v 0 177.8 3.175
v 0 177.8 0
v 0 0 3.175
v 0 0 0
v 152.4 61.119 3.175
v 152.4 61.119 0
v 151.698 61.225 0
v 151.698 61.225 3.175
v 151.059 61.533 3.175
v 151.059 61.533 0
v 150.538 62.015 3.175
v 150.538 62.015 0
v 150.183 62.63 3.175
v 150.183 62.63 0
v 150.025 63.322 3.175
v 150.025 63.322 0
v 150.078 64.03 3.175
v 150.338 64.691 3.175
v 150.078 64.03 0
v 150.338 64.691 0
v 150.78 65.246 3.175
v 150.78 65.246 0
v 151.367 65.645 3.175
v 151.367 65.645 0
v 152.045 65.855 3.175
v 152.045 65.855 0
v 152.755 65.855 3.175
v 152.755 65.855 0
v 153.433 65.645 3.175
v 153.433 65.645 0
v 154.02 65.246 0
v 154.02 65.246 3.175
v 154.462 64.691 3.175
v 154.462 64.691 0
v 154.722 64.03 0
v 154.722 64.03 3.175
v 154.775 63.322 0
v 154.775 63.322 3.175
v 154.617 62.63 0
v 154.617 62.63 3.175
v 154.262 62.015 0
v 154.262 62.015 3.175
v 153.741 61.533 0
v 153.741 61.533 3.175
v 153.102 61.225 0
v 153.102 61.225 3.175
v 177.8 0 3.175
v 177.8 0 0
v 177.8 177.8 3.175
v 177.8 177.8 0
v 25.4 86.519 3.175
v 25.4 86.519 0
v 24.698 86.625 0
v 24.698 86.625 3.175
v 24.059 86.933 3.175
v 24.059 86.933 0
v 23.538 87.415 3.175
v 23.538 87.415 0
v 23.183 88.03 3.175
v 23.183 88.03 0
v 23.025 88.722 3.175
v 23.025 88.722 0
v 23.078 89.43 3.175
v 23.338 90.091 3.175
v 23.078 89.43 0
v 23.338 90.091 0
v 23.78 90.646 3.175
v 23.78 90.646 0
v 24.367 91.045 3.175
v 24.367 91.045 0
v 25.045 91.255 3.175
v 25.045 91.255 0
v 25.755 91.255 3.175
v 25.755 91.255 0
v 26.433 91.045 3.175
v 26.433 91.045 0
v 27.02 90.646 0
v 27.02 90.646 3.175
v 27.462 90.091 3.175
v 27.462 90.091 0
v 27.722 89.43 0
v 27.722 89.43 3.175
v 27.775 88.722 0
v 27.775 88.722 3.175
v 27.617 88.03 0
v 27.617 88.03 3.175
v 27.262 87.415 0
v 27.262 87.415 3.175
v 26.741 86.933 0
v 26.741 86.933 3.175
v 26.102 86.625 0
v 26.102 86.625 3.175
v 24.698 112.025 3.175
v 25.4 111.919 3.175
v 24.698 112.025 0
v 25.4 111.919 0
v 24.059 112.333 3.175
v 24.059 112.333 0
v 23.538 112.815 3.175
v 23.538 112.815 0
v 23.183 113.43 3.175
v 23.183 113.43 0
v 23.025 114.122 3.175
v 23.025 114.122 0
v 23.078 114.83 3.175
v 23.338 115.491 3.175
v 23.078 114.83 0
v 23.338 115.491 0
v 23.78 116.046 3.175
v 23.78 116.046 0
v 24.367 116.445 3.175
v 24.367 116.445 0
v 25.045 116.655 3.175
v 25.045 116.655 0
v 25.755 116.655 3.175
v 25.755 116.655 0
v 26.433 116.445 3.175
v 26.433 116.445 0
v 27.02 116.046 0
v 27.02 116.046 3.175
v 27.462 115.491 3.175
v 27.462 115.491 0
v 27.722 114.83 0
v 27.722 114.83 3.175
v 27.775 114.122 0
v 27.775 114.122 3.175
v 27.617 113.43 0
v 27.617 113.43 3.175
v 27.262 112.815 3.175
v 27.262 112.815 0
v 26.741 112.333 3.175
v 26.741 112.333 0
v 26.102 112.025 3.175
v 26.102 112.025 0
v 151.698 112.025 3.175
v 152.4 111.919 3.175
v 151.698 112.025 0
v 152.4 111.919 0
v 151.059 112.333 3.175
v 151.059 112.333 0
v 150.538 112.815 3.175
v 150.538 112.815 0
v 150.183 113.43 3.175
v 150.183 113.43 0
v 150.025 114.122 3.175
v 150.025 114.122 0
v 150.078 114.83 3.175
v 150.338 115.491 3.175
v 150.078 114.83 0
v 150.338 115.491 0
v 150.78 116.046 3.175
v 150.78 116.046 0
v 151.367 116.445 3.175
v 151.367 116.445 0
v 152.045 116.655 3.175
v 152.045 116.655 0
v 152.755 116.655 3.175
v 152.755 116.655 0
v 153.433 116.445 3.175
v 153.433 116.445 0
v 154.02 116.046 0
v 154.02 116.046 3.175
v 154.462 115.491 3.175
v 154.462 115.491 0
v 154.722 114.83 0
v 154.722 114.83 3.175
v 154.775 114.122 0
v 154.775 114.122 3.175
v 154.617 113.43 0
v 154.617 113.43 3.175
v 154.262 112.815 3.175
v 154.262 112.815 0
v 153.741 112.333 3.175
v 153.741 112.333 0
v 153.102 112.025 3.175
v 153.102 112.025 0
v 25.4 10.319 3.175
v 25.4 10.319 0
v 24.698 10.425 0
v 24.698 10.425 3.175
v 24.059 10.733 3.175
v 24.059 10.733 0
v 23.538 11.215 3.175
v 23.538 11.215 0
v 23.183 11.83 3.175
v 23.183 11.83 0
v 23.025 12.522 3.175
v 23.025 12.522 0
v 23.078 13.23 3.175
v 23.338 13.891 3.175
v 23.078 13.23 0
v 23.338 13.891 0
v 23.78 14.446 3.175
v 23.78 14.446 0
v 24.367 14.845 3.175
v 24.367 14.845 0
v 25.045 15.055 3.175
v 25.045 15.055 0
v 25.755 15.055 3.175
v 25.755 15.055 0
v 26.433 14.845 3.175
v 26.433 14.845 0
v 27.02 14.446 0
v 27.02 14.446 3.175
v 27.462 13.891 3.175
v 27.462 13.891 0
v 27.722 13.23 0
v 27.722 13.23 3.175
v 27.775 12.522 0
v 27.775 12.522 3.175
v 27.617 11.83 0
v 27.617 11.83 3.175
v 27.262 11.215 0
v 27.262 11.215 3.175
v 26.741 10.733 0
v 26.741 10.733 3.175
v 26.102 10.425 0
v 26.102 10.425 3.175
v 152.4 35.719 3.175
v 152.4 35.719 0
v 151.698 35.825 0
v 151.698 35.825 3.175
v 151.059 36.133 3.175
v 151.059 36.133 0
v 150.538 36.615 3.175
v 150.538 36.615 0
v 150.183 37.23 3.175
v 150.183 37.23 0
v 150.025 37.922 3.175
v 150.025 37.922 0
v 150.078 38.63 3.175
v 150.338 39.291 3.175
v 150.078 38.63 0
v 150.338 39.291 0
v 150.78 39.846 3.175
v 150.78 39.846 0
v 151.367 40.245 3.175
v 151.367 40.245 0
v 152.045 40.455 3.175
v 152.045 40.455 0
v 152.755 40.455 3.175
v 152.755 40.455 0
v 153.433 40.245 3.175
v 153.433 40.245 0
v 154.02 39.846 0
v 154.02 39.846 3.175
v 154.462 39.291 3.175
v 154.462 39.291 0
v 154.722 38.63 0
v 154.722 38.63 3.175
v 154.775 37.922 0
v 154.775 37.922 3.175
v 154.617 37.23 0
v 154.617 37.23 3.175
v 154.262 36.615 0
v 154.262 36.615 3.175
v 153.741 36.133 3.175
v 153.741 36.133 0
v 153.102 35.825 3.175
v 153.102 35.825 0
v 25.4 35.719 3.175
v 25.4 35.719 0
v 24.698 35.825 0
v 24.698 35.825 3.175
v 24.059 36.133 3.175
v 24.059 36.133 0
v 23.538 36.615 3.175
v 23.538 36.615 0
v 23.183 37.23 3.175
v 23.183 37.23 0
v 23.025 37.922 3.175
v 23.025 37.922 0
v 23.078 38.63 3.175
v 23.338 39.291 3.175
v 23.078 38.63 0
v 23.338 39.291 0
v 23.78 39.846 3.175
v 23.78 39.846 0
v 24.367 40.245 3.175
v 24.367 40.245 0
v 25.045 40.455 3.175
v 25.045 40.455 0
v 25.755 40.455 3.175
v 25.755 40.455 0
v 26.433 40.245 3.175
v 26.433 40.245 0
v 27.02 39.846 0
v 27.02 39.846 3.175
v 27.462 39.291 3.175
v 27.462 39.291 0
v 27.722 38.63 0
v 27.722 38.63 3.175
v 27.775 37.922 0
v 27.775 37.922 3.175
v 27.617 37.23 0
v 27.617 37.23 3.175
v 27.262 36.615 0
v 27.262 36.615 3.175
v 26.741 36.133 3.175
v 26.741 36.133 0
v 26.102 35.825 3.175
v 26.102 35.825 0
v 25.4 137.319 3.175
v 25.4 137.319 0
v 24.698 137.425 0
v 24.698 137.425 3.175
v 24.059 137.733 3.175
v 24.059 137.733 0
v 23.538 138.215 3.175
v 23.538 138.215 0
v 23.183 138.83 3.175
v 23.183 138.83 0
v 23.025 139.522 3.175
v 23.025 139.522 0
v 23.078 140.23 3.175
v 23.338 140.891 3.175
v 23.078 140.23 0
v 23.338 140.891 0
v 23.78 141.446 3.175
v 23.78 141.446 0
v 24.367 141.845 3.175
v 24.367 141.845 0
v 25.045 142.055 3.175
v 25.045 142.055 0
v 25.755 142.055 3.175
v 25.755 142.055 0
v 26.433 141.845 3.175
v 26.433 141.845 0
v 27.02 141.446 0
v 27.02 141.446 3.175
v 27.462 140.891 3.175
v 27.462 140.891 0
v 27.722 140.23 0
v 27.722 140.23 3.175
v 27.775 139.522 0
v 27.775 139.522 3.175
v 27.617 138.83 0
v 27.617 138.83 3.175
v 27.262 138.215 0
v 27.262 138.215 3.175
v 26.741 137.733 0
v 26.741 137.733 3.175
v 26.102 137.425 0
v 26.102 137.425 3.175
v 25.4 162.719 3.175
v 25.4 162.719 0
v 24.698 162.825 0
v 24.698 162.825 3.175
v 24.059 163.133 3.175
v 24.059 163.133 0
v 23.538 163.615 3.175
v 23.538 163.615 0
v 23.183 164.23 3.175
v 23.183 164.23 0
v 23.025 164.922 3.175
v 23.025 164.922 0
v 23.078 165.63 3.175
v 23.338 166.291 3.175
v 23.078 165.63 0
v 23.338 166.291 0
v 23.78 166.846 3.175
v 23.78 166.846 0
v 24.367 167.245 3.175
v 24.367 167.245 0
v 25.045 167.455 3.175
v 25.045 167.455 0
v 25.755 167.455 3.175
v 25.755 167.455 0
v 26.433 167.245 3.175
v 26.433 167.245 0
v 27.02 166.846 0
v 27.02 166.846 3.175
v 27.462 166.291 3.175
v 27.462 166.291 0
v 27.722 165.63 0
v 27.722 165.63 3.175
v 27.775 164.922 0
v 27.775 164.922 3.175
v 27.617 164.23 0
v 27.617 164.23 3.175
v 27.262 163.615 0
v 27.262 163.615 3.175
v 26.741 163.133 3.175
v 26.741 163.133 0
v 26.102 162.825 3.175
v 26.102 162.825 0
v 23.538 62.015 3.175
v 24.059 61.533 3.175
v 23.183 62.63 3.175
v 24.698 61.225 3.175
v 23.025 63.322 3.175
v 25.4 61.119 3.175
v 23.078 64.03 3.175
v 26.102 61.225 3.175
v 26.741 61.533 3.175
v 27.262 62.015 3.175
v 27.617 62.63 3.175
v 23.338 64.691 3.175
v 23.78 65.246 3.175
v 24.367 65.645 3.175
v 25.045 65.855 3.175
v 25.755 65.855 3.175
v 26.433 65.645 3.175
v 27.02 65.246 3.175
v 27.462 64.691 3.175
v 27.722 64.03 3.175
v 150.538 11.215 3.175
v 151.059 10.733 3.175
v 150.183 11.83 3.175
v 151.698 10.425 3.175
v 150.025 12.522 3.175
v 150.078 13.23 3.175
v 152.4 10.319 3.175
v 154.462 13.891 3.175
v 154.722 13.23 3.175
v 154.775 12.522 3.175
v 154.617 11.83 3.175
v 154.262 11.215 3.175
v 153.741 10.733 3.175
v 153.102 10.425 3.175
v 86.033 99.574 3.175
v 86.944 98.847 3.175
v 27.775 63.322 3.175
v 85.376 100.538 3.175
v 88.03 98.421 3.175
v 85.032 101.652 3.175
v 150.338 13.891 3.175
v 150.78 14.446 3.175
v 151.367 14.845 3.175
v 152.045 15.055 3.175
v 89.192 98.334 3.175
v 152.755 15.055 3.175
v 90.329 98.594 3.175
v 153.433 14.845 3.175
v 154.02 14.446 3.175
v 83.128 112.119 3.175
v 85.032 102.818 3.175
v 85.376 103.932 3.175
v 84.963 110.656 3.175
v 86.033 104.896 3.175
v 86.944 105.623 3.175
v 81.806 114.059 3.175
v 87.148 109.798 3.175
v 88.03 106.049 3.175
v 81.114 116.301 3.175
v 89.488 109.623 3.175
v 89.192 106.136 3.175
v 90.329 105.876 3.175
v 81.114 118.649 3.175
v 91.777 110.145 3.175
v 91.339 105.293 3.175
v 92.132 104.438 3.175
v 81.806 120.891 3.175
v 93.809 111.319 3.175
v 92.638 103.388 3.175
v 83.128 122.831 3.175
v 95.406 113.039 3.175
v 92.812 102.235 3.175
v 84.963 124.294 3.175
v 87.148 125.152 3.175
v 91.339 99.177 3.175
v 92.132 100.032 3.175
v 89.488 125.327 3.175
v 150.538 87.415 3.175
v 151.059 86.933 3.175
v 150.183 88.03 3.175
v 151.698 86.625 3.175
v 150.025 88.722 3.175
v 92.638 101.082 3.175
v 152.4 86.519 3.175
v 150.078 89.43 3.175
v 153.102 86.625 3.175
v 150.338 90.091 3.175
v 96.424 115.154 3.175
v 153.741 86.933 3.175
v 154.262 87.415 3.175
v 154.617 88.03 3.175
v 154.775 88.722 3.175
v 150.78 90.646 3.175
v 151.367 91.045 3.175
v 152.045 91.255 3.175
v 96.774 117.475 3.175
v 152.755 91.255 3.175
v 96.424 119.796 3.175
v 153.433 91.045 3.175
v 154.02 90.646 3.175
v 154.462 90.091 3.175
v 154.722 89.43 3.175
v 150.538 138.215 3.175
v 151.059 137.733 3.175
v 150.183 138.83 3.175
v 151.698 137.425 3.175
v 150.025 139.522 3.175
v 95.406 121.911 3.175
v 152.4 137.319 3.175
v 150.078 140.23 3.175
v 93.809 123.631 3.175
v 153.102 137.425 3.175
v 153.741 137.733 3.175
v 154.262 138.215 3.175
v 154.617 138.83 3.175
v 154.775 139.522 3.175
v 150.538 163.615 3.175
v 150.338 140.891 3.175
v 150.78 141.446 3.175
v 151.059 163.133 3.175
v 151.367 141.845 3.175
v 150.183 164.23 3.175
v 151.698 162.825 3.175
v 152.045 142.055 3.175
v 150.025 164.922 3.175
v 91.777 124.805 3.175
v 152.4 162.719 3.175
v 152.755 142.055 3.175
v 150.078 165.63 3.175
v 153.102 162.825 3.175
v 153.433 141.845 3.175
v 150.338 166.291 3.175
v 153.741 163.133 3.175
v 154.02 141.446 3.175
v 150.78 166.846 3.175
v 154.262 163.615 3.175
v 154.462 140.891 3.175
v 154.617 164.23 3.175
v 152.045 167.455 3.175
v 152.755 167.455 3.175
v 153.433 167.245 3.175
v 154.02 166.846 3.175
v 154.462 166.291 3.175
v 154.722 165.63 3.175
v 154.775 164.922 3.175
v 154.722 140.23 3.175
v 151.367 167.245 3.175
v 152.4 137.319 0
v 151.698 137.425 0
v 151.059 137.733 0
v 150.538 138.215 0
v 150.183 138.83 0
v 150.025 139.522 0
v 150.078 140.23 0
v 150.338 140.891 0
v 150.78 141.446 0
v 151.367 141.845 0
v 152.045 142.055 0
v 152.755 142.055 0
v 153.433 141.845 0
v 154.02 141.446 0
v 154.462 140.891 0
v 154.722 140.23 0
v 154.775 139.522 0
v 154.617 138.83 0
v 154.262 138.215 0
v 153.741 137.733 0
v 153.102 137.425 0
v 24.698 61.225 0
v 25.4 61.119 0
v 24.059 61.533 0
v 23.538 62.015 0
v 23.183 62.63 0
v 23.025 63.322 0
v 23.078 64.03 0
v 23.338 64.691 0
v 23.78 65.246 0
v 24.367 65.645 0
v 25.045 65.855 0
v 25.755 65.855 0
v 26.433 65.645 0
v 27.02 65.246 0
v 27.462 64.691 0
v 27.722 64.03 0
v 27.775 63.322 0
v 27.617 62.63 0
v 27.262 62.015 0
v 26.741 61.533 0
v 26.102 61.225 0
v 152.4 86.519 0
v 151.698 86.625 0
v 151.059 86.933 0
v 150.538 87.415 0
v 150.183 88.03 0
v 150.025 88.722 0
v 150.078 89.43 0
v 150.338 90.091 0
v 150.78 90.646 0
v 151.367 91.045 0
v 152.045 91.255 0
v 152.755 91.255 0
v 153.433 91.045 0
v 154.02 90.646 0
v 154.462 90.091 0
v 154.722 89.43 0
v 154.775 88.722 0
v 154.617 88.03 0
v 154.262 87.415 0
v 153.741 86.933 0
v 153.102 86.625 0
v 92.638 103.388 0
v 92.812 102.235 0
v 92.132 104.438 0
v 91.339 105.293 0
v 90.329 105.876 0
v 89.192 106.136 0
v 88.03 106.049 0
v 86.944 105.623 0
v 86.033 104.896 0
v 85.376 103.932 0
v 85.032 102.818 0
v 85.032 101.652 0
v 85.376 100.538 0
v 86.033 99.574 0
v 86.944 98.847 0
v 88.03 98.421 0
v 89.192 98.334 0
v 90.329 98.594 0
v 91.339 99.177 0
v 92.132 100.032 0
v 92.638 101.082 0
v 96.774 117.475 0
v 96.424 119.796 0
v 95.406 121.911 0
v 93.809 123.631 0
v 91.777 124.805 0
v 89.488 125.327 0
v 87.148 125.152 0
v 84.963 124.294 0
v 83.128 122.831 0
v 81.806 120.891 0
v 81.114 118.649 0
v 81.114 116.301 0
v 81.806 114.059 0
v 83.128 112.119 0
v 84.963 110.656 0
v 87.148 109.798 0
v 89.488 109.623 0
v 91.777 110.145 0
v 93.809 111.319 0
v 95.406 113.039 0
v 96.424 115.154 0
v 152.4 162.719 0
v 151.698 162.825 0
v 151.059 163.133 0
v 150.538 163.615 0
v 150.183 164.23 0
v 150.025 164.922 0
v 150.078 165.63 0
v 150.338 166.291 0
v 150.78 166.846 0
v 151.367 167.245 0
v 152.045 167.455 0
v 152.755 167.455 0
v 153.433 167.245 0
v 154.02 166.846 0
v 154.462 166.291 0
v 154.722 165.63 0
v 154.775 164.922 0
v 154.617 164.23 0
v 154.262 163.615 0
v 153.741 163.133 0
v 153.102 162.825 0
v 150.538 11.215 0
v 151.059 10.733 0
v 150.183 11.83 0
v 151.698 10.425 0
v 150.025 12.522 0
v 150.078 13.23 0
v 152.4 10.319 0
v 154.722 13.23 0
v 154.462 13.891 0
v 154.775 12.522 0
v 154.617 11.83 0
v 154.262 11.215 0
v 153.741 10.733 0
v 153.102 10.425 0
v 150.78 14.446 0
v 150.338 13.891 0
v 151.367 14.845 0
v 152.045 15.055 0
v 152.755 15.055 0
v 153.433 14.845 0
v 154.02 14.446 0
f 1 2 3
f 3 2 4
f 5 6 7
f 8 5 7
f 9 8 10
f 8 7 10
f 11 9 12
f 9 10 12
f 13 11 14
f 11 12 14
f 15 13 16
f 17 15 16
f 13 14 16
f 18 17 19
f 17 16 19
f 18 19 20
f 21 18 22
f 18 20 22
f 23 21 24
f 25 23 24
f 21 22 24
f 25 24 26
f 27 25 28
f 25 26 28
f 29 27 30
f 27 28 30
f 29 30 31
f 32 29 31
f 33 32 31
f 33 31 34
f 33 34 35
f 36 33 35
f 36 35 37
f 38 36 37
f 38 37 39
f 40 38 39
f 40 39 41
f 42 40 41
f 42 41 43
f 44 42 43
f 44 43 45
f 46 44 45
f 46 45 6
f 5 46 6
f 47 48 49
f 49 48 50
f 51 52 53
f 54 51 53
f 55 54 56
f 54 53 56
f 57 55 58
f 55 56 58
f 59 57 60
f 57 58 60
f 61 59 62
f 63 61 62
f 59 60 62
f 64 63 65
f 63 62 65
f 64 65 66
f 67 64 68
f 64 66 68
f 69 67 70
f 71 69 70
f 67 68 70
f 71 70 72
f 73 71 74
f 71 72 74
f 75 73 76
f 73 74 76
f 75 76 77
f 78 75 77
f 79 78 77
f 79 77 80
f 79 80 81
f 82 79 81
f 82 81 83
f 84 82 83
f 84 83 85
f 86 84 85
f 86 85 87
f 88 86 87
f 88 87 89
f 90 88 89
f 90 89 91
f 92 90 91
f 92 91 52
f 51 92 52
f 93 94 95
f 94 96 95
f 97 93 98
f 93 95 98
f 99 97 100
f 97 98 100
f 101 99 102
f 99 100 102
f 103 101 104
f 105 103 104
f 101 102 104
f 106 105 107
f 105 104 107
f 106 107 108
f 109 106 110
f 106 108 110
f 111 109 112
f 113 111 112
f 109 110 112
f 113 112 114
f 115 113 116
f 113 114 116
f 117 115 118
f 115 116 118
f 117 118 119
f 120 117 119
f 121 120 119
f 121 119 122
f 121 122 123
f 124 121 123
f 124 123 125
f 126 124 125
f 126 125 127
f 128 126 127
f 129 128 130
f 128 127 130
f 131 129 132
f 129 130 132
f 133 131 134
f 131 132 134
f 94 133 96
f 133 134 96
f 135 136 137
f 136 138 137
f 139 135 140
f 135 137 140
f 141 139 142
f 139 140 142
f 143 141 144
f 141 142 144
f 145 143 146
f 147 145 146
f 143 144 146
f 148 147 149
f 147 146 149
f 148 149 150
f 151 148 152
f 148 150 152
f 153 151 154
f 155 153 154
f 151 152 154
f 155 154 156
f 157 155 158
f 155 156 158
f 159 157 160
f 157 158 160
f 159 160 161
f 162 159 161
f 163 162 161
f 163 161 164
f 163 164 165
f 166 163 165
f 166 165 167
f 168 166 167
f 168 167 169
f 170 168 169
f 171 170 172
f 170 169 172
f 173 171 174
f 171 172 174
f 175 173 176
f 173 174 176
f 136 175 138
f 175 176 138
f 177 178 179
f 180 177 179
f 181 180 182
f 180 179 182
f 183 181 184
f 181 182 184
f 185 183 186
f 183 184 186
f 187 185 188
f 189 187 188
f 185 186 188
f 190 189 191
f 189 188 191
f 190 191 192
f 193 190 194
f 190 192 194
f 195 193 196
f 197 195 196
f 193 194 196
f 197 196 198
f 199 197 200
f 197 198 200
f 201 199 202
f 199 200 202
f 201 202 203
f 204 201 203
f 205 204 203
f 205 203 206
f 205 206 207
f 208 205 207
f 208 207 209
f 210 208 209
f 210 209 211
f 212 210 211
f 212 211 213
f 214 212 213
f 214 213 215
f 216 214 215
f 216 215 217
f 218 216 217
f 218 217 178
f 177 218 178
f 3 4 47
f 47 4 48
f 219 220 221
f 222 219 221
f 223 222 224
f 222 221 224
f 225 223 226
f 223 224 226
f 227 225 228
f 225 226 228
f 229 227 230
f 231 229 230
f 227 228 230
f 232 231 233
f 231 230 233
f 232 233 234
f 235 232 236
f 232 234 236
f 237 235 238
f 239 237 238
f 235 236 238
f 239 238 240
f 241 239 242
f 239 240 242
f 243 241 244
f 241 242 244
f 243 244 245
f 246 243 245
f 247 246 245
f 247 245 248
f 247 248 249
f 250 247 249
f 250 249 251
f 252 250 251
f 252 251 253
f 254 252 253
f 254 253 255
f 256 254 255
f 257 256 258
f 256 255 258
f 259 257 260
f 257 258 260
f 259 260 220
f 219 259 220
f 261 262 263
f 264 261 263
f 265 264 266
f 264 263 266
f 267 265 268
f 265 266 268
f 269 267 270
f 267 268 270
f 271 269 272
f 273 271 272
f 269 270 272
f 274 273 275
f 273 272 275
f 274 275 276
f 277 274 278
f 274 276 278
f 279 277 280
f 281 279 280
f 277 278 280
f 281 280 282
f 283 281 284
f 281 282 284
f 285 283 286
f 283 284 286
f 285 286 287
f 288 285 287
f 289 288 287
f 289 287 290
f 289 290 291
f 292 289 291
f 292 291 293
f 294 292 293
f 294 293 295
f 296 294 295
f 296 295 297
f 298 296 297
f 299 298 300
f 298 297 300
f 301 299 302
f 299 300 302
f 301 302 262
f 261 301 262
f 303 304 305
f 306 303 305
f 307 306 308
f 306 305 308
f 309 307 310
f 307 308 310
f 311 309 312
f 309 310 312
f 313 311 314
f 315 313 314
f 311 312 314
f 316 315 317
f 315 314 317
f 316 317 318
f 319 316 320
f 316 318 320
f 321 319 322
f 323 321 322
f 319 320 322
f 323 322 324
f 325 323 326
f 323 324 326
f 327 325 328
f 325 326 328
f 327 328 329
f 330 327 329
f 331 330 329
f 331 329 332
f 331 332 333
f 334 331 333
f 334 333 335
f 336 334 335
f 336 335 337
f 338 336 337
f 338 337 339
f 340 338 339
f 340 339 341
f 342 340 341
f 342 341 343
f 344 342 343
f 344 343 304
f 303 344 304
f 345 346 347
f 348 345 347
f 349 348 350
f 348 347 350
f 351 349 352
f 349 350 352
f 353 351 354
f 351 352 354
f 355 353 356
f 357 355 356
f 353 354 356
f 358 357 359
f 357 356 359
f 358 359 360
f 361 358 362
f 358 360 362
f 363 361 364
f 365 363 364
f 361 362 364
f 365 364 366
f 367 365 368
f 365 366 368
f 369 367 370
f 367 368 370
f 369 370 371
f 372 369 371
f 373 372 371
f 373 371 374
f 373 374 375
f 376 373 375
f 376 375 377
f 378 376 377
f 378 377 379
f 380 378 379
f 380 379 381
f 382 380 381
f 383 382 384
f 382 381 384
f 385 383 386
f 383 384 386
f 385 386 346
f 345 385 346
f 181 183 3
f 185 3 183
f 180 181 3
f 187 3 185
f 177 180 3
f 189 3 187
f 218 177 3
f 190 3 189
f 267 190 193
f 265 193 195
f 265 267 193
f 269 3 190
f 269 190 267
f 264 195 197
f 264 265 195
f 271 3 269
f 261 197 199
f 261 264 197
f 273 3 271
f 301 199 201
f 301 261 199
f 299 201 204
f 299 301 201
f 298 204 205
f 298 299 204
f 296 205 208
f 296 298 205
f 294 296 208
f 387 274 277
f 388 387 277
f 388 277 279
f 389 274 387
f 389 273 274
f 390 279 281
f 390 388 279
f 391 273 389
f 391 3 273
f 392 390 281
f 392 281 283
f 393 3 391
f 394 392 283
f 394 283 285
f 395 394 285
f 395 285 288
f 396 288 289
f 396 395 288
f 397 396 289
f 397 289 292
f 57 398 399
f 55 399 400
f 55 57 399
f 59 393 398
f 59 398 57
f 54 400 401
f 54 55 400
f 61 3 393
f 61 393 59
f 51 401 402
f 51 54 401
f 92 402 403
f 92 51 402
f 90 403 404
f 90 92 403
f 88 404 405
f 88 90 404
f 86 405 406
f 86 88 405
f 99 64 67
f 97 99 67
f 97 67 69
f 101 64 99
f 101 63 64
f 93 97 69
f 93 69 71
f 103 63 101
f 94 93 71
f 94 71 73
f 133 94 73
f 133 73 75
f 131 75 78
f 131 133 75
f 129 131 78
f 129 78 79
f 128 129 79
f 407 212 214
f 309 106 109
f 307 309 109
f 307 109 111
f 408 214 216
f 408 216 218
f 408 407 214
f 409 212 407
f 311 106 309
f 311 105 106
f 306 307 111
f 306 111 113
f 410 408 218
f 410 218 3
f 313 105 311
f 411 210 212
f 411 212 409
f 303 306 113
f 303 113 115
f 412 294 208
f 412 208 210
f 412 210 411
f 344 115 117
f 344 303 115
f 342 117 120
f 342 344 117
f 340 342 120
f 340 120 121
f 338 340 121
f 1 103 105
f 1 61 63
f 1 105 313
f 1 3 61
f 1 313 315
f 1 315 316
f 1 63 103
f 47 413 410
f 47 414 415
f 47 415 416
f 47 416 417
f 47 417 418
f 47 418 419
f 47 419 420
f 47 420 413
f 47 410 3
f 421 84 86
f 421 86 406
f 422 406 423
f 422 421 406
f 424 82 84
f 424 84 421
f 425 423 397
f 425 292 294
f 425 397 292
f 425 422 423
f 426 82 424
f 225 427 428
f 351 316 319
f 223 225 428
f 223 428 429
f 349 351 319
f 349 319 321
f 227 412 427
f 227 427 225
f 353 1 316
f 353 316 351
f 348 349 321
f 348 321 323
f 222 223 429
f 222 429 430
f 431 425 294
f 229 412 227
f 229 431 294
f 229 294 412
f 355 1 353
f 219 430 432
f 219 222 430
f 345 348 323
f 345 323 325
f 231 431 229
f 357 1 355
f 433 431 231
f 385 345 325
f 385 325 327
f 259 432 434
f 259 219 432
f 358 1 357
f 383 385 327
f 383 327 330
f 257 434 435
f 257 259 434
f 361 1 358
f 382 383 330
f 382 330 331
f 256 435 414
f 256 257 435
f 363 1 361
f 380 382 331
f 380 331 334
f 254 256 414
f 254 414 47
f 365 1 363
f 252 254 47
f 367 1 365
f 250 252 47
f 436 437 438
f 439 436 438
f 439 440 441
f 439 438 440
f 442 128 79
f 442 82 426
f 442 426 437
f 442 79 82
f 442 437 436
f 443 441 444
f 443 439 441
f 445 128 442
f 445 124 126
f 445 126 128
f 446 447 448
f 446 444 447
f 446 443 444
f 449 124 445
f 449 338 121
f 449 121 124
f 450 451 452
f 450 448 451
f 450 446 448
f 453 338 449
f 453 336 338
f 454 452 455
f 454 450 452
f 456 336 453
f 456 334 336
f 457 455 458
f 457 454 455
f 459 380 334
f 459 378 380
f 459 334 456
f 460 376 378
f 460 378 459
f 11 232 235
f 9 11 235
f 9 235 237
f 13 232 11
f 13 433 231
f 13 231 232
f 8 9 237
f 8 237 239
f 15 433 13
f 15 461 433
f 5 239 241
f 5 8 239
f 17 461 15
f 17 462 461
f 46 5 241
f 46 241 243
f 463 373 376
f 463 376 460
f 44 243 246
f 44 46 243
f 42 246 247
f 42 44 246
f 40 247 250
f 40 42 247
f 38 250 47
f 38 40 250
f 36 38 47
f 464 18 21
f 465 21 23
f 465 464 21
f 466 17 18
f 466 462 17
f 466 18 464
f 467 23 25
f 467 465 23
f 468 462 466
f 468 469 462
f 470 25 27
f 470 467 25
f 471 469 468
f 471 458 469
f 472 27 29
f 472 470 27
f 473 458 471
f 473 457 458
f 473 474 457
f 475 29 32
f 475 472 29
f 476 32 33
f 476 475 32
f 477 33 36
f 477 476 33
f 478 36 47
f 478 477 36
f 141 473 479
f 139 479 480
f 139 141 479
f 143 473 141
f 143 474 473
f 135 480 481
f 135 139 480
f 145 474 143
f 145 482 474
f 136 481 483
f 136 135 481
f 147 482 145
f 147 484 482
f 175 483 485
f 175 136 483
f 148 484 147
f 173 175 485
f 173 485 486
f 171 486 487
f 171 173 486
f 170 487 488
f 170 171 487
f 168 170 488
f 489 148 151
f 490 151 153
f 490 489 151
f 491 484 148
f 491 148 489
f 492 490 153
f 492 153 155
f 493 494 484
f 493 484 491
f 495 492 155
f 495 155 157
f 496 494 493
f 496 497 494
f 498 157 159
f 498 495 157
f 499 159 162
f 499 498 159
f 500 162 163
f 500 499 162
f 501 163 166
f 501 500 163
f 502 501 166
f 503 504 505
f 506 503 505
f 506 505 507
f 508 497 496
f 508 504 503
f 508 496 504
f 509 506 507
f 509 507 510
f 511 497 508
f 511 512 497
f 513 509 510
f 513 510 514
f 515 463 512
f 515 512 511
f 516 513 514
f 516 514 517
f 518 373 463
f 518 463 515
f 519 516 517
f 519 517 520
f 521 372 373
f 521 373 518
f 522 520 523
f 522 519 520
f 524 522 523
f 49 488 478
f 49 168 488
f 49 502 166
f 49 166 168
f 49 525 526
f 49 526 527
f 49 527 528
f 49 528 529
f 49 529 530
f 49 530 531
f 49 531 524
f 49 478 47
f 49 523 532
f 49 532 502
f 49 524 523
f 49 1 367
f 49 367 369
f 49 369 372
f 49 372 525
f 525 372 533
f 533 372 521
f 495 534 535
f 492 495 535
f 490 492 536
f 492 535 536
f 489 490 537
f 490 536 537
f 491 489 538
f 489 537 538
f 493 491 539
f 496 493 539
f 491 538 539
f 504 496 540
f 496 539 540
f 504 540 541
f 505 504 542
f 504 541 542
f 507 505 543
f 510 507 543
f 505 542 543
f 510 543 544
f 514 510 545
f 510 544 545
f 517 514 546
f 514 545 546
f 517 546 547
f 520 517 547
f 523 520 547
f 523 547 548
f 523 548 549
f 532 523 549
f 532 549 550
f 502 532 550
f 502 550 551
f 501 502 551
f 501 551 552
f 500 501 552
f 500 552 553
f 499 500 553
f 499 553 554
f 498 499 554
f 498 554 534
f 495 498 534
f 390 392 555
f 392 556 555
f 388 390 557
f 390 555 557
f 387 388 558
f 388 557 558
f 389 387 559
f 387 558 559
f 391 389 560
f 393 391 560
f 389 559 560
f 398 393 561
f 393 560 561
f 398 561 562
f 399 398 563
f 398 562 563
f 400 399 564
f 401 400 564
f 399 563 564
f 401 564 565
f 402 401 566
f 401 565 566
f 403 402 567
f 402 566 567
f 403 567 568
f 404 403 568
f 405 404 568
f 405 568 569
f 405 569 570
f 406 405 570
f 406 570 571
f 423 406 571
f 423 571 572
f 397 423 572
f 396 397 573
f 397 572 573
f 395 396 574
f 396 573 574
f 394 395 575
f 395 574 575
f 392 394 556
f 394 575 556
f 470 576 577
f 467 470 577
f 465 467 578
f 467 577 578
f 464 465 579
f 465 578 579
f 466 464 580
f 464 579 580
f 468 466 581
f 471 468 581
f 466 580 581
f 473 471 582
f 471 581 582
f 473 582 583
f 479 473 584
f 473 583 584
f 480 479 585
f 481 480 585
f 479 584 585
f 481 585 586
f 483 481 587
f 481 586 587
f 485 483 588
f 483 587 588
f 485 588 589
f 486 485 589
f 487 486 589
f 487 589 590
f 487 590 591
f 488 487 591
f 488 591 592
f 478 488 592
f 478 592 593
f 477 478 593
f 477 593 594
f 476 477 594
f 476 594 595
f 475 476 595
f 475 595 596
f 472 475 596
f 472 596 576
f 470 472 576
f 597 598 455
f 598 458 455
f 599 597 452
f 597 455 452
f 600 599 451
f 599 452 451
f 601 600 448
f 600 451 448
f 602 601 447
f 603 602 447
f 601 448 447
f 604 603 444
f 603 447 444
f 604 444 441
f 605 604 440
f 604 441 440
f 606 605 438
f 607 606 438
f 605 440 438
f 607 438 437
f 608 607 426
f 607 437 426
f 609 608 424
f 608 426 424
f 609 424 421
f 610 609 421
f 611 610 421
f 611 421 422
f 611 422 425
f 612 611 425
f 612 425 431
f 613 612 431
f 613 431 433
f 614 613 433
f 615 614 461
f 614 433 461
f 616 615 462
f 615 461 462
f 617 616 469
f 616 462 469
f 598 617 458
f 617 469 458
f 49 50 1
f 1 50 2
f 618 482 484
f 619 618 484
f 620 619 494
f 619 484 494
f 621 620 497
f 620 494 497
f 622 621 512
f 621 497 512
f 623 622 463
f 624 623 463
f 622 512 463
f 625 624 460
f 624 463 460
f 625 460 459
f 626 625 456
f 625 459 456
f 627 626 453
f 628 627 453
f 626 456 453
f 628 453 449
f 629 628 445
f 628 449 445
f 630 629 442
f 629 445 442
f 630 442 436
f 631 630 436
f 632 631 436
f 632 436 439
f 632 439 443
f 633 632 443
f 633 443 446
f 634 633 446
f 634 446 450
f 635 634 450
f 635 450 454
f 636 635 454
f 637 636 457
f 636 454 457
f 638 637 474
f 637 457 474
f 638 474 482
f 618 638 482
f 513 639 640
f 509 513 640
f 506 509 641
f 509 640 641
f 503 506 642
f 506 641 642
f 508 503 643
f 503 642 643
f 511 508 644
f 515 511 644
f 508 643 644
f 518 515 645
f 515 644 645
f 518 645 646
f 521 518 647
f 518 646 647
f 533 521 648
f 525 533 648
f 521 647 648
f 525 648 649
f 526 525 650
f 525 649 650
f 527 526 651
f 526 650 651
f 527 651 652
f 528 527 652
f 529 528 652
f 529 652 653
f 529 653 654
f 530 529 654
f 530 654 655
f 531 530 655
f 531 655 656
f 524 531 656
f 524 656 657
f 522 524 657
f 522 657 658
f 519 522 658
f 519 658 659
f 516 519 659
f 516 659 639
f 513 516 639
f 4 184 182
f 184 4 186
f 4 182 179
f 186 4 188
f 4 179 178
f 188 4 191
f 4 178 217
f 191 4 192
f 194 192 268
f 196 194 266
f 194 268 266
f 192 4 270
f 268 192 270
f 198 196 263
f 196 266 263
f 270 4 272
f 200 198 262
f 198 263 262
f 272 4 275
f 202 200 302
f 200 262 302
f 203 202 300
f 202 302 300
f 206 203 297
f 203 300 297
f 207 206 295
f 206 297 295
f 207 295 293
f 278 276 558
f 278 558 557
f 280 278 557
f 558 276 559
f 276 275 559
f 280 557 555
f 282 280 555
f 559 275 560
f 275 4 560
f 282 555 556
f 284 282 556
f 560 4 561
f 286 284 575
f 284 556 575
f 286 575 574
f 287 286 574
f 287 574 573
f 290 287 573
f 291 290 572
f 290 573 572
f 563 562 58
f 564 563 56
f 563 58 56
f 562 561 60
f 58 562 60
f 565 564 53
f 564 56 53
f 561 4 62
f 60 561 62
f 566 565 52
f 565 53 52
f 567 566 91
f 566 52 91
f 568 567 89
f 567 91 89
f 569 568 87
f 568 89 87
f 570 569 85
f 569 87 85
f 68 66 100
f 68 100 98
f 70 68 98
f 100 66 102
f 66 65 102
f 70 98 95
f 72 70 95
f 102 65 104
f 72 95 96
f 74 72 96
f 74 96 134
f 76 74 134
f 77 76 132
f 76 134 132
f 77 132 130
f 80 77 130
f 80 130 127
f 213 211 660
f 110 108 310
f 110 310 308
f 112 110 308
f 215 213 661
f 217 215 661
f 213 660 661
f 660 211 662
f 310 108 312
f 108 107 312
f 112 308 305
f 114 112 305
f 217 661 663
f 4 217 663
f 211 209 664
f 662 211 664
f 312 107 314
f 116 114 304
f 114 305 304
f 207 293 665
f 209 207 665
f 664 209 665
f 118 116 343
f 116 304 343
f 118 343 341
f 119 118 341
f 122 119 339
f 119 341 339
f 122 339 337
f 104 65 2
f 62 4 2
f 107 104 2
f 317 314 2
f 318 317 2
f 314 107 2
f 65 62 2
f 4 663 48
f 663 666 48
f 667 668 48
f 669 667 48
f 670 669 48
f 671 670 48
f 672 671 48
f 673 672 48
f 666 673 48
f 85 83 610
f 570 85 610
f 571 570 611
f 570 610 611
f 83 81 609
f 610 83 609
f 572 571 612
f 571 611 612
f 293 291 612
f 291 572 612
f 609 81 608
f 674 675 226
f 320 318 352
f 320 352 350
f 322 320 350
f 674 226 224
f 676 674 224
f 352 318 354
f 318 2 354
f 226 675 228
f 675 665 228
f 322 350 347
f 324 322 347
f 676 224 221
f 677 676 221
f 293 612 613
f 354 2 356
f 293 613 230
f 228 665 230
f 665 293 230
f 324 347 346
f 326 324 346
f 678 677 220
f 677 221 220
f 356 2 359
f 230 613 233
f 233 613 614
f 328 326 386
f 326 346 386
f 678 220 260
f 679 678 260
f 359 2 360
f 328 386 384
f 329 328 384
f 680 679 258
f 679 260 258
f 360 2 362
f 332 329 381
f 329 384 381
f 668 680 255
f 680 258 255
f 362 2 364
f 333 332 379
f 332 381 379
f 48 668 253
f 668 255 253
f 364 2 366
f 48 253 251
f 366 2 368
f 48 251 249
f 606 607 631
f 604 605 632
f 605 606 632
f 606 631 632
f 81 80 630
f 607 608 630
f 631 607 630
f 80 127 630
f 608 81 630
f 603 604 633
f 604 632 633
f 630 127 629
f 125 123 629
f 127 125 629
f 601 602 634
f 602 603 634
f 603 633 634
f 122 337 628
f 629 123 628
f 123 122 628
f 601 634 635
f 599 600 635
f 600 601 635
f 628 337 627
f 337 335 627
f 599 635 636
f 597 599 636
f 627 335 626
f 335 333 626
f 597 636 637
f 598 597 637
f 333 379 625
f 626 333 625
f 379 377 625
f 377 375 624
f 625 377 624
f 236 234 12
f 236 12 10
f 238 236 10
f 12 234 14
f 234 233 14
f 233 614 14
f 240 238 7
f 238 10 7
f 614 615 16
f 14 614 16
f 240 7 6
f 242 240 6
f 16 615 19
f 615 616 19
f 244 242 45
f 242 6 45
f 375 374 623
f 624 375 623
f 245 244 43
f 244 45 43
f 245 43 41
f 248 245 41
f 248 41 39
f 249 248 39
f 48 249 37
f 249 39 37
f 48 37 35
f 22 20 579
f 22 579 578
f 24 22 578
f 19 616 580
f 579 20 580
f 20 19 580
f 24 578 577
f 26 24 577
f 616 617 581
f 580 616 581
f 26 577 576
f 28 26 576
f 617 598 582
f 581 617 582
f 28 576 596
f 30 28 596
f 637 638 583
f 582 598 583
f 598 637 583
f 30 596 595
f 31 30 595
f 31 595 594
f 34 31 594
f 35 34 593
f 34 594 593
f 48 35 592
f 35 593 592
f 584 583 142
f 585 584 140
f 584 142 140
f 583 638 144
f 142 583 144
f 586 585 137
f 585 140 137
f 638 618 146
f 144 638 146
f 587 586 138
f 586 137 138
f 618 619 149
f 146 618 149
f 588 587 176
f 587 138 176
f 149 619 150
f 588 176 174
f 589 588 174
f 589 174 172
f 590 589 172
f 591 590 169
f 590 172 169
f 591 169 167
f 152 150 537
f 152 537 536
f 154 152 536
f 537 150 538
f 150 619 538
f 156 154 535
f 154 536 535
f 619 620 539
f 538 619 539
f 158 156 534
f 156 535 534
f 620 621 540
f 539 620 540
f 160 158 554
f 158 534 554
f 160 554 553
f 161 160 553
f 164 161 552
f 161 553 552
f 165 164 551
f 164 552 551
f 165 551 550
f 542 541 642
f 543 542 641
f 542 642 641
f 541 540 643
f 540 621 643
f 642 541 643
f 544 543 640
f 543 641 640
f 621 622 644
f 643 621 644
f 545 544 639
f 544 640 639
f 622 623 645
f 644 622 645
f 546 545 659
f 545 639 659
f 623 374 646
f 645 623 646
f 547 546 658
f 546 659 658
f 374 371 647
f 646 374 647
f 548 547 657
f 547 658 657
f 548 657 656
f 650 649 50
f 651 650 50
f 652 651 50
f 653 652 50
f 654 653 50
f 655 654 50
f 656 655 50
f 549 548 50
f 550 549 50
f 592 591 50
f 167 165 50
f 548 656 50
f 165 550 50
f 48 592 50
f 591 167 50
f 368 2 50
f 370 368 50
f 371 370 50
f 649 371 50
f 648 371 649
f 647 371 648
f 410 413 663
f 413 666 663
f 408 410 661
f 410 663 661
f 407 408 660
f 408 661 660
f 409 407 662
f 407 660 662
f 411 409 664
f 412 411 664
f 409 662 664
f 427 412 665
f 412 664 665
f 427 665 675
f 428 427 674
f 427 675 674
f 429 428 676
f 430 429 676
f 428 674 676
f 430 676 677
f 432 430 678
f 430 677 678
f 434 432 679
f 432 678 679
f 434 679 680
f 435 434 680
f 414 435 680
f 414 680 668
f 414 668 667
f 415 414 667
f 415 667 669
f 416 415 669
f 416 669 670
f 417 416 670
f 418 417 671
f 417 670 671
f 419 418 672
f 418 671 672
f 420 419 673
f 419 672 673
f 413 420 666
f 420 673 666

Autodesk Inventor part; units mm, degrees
ref_plane "YZ Plane" through (0, 0, 0) normal (1, 0, 0) x (0, 1, 0)
ref_plane "XZ Plane" through (0, 0, 0) normal (0, 1, 0) x (-1, 0, 0)
ref_plane "XY Plane" through (0, 0, 0) normal (0, 0, 1) x (1, 0, 0)
sketch "Sketch1" plane through (0, 0, 0) normal (0, 0, 1) x (1, 0, 0)
  line L0 (0, 0) -> (177.8, 0)
  line L1 (177.8, 0) -> (177.8, 177.8)
  line L2 (177.8, 177.8) -> (0, 177.8)
  line L3 (0, 177.8) -> (0, 0)
  dimension "d0" = 177.8
  dimension "d1" = 177.8
extrude "Extrusion1" add sketch "Sketch1" along normal blind 3.175
sketch "Sketch2" plane through (0, 0, 3.175) normal (0, 0, 1) x (1, 0, 0)
  line L0 (0, 0) -> (177.8, 0) projected
  line L1 (177.8, 0) -> (177.8, 177.8) projected
  line L2 (177.8, 177.8) -> (0, 177.8) construction
  line L3 (0, 177.8) -> (0, 0) projected
  line L4 (177.8, 177.8) -> (0, 177.8) construction
  line L5 (88.9, 177.8) -> (76.2, 177.8) construction
  line L6 (88.9, 177.8) -> (101.6, 177.8) construction
  line L7 (76.2, 177.8) -> (76.2, 127) construction
  line L8 (76.2, 127) -> (101.6, 127) construction
  line L9 (101.6, 177.8) -> (101.6, 127) construction
  line L10 (88.9, 127) -> (88.9, 107.95) construction
  circle A0 centre (88.9, 117.475) radius 9.525 construction
  circle A1 centre (88.9, 117.475) radius 7.874
  dimension "d4" = 12.7
  dimension "d5" = 12.7
  dimension "d6" = 50.8
  dimension "d7" = 19.05
  dimension "d8" = 15.748
extrude "Extrusion2" cut sketch "Sketch2" against normal through all
sketch "Sketch3" plane through (0, 0, 3.175) normal (0, 0, 1) x (1, 0, 0)
  circle A0 centre (88.9, 117.475) radius 7.874 projected
  line L0 (0, 0) -> (177.8, 0) projected
  line L1 (177.8, 0) -> (177.8, 177.8) projected
  line L2 (177.8, 177.8) -> (0, 177.8) projected
  line L3 (0, 177.8) -> (0, 0) projected
  circle A1 centre (88.9, 117.475) radius 10.16 construction
  line L4 (88.9, 117.475) -> (88.9, 107.315) construction
  line L5 (88.9, 107.315) -> (88.9, 102.235) construction
  circle A2 centre (88.9, 102.235) radius 3.9116
  dimension "d11" = 20.32
  dimension "d12" = 5.08
  dimension "d13" = 7.8232
extrude "Extrusion3" cut sketch "Sketch3" against normal through all contours A2
sketch "Sketch4" plane through (0, 0, 3.175) normal (0, 0, 1) x (1, 0, 0)
  circle A0 centre (88.9, 102.235) radius 3.9116 projected
  circle A1 centre (88.9, 117.475) radius 7.874 projected
  line L0 (0, 0) -> (177.8, 0) projected
  line L1 (177.8, 0) -> (177.8, 177.8) projected
  line L2 (177.8, 177.8) -> (0, 177.8) construction
  line L3 (0, 177.8) -> (0, 0) projected
  line L4 (0, 177.8) -> (25.4, 177.8) construction
  line L5 (177.8, 177.8) -> (0, 177.8) construction
  line L6 (177.8, 177.8) -> (152.4, 177.8) construction
  line L7 (25.4, 177.8) -> (25.4, 152.4) construction
  line L8 (152.4, 177.8) -> (152.4, 152.4) construction
  circle A2 centre (25.4, 152.4) radius 2.3812
  circle A3 centre (152.4, 152.4) radius 2.3813
  line L9 (0, 165.1) -> (25.4, 165.1) construction
  line L10 (177.8, 165.1) -> (152.4, 165.1) construction
  line L11 (25.4, 165.1) -> (25.4, 139.7) construction
  line L12 (152.4, 165.1) -> (152.4, 139.7) construction
  circle A4 centre (25.4, 139.7) radius 2.3812
  line L13 (0, 152.4) -> (25.4, 152.4) construction
  line L14 (177.8, 152.4) -> (152.4, 152.4) construction
  line L15 (25.4, 152.4) -> (25.4, 127) construction
  line L16 (152.4, 152.4) -> (152.4, 127) construction
  circle A5 centre (25.4, 127) radius 2.3812
  line L17 (0, 139.7) -> (25.4, 139.7) construction
  line L18 (177.8, 139.7) -> (152.4, 139.7) construction
  line L19 (25.4, 139.7) -> (25.4, 114.3) construction
  line L20 (152.4, 139.7) -> (152.4, 114.3) construction
  circle A6 centre (25.4, 114.3) radius 2.3812
  line L21 (0, 127) -> (25.4, 127) construction
  line L22 (177.8, 127) -> (152.4, 127) construction
  line L23 (25.4, 127) -> (25.4, 101.6) construction
  line L24 (152.4, 127) -> (152.4, 101.6) construction
  circle A7 centre (25.4, 101.6) radius 2.3812
  line L25 (0, 114.3) -> (25.4, 114.3) construction
  line L26 (177.8, 114.3) -> (152.4, 114.3) construction
  line L27 (25.4, 114.3) -> (25.4, 88.9) construction
  line L28 (152.4, 114.3) -> (152.4, 88.9) construction
  circle A8 centre (25.4, 88.9) radius 2.3812
  line L29 (0, 101.6) -> (25.4, 101.6) construction
  line L30 (177.8, 101.6) -> (152.4, 101.6) construction
  line L31 (25.4, 101.6) -> (25.4, 76.2) construction
  line L32 (152.4, 101.6) -> (152.4, 76.2) construction
  circle A9 centre (25.4, 76.2) radius 2.3812
  line L33 (0, 88.9) -> (25.4, 88.9) construction
  line L34 (177.8, 88.9) -> (152.4, 88.9) construction
  line L35 (25.4, 88.9) -> (25.4, 63.5) construction
  line L36 (152.4, 88.9) -> (152.4, 63.5) construction
  circle A10 centre (25.4, 63.5) radius 2.3812
  line L37 (0, 76.2) -> (25.4, 76.2) construction
  line L38 (177.8, 76.2) -> (152.4, 76.2) construction
  line L39 (25.4, 76.2) -> (25.4, 50.8) construction
  line L40 (152.4, 76.2) -> (152.4, 50.8) construction
  circle A11 centre (25.4, 50.8) radius 2.3812
  line L41 (0, 63.5) -> (25.4, 63.5) construction
  line L42 (177.8, 63.5) -> (152.4, 63.5) construction
  line L43 (25.4, 63.5) -> (25.4, 38.1) construction
  line L44 (152.4, 63.5) -> (152.4, 38.1) construction
  circle A12 centre (25.4, 38.1) radius 2.3812
  line L45 (0, 50.8) -> (25.4, 50.8) construction
  line L46 (177.8, 50.8) -> (152.4, 50.8) construction
  line L47 (25.4, 50.8) -> (25.4, 25.4) construction
  line L48 (152.4, 50.8) -> (152.4, 25.4) construction
  circle A13 centre (25.4, 25.4) radius 2.3812
  line L49 (0, 38.1) -> (25.4, 38.1) construction
  line L50 (177.8, 38.1) -> (152.4, 38.1) construction
  line L51 (25.4, 38.1) -> (25.4, 12.7) construction
  line L52 (152.4, 38.1) -> (152.4, 12.7) construction
  circle A14 centre (25.4, 12.7) radius 2.3812
  circle A15 centre (152.4, 139.7) radius 2.3813
  circle A16 centre (152.4, 127) radius 2.3813
  circle A17 centre (152.4, 114.3) radius 2.3813
  circle A18 centre (152.4, 101.6) radius 2.3813
  circle A19 centre (152.4, 88.9) radius 2.3813
  circle A20 centre (152.4, 76.2) radius 2.3813
  circle A21 centre (152.4, 63.5) radius 2.3813
  circle A22 centre (152.4, 50.8) radius 2.3813
  circle A23 centre (152.4, 38.1) radius 2.3813
  circle A24 centre (152.4, 25.4) radius 2.3813
  circle A25 centre (152.4, 12.7) radius 2.3813
  circle A26 centre (25.4, 165.1) radius 2.3813
  circle A27 centre (152.4, 165.1) radius 2.3812
  dimension "d16" = 25.4
  dimension "d17" = 25.4
  dimension "d18" = 25.4
  dimension "d19" = 25.4
  dimension "d20" = 4.7625
  dimension "d21" = 4.7625
  dimension "d24" = 12.7
  dimension "d31" = 12.7
  dimension "d47" = 4.7625
  dimension "d48" = 4.7625
sketch "Sketch5" plane through (0, 0, 3.175) normal (0, 0, 1) x (1, 0, 0)
  circle A0 centre (88.9, 102.235) radius 3.9116 construction
  circle A1 centre (88.9, 117.475) radius 7.874 construction
  line L0 (0, 0) -> (177.8, 0) construction
  line L1 (177.8, 0) -> (177.8, 177.8) construction
  line L2 (177.8, 177.8) -> (0, 177.8) construction
  line L3 (0, 177.8) -> (0, 0) construction
  line L4 (177.8, 177.8) -> (0, 177.8) construction
  line L5 (88.9, 177.8) -> (76.2, 177.8) construction
  line L6 (88.9, 177.8) -> (101.6, 177.8) construction
  line L7 (76.2, 177.8) -> (25.4, 177.8)
  line L8 (101.6, 177.8) -> (152.4, 177.8)
  dimension "d43" = 12.7
  dimension "d44" = 12.7
  dimension "d45" = 50.8
  dimension "d46" = 50.8
hole "Hole2" at (25.4, 165.1, 3.175) at (152.4, 165.1, 3.175) at (25.4, 139.7, 3.175) at (25.4, 114.3, 3.175) at (25.4, 88.9, 3.175) at (25.4, 63.5, 3.175) at (25.4, 38.1, 3.175) at (25.4, 12.7, 3.175) at (152.4, 139.7, 3.175) at (152.4, 114.3, 3.175) at (152.4, 88.9, 3.175) at (152.4, 63.5, 3.175) at (152.4, 38.1, 3.175) at (152.4, 12.7, 3.175) direction (0, 0, -1) diameter 4.7625 end through all
properties part number "ClawPlate"
